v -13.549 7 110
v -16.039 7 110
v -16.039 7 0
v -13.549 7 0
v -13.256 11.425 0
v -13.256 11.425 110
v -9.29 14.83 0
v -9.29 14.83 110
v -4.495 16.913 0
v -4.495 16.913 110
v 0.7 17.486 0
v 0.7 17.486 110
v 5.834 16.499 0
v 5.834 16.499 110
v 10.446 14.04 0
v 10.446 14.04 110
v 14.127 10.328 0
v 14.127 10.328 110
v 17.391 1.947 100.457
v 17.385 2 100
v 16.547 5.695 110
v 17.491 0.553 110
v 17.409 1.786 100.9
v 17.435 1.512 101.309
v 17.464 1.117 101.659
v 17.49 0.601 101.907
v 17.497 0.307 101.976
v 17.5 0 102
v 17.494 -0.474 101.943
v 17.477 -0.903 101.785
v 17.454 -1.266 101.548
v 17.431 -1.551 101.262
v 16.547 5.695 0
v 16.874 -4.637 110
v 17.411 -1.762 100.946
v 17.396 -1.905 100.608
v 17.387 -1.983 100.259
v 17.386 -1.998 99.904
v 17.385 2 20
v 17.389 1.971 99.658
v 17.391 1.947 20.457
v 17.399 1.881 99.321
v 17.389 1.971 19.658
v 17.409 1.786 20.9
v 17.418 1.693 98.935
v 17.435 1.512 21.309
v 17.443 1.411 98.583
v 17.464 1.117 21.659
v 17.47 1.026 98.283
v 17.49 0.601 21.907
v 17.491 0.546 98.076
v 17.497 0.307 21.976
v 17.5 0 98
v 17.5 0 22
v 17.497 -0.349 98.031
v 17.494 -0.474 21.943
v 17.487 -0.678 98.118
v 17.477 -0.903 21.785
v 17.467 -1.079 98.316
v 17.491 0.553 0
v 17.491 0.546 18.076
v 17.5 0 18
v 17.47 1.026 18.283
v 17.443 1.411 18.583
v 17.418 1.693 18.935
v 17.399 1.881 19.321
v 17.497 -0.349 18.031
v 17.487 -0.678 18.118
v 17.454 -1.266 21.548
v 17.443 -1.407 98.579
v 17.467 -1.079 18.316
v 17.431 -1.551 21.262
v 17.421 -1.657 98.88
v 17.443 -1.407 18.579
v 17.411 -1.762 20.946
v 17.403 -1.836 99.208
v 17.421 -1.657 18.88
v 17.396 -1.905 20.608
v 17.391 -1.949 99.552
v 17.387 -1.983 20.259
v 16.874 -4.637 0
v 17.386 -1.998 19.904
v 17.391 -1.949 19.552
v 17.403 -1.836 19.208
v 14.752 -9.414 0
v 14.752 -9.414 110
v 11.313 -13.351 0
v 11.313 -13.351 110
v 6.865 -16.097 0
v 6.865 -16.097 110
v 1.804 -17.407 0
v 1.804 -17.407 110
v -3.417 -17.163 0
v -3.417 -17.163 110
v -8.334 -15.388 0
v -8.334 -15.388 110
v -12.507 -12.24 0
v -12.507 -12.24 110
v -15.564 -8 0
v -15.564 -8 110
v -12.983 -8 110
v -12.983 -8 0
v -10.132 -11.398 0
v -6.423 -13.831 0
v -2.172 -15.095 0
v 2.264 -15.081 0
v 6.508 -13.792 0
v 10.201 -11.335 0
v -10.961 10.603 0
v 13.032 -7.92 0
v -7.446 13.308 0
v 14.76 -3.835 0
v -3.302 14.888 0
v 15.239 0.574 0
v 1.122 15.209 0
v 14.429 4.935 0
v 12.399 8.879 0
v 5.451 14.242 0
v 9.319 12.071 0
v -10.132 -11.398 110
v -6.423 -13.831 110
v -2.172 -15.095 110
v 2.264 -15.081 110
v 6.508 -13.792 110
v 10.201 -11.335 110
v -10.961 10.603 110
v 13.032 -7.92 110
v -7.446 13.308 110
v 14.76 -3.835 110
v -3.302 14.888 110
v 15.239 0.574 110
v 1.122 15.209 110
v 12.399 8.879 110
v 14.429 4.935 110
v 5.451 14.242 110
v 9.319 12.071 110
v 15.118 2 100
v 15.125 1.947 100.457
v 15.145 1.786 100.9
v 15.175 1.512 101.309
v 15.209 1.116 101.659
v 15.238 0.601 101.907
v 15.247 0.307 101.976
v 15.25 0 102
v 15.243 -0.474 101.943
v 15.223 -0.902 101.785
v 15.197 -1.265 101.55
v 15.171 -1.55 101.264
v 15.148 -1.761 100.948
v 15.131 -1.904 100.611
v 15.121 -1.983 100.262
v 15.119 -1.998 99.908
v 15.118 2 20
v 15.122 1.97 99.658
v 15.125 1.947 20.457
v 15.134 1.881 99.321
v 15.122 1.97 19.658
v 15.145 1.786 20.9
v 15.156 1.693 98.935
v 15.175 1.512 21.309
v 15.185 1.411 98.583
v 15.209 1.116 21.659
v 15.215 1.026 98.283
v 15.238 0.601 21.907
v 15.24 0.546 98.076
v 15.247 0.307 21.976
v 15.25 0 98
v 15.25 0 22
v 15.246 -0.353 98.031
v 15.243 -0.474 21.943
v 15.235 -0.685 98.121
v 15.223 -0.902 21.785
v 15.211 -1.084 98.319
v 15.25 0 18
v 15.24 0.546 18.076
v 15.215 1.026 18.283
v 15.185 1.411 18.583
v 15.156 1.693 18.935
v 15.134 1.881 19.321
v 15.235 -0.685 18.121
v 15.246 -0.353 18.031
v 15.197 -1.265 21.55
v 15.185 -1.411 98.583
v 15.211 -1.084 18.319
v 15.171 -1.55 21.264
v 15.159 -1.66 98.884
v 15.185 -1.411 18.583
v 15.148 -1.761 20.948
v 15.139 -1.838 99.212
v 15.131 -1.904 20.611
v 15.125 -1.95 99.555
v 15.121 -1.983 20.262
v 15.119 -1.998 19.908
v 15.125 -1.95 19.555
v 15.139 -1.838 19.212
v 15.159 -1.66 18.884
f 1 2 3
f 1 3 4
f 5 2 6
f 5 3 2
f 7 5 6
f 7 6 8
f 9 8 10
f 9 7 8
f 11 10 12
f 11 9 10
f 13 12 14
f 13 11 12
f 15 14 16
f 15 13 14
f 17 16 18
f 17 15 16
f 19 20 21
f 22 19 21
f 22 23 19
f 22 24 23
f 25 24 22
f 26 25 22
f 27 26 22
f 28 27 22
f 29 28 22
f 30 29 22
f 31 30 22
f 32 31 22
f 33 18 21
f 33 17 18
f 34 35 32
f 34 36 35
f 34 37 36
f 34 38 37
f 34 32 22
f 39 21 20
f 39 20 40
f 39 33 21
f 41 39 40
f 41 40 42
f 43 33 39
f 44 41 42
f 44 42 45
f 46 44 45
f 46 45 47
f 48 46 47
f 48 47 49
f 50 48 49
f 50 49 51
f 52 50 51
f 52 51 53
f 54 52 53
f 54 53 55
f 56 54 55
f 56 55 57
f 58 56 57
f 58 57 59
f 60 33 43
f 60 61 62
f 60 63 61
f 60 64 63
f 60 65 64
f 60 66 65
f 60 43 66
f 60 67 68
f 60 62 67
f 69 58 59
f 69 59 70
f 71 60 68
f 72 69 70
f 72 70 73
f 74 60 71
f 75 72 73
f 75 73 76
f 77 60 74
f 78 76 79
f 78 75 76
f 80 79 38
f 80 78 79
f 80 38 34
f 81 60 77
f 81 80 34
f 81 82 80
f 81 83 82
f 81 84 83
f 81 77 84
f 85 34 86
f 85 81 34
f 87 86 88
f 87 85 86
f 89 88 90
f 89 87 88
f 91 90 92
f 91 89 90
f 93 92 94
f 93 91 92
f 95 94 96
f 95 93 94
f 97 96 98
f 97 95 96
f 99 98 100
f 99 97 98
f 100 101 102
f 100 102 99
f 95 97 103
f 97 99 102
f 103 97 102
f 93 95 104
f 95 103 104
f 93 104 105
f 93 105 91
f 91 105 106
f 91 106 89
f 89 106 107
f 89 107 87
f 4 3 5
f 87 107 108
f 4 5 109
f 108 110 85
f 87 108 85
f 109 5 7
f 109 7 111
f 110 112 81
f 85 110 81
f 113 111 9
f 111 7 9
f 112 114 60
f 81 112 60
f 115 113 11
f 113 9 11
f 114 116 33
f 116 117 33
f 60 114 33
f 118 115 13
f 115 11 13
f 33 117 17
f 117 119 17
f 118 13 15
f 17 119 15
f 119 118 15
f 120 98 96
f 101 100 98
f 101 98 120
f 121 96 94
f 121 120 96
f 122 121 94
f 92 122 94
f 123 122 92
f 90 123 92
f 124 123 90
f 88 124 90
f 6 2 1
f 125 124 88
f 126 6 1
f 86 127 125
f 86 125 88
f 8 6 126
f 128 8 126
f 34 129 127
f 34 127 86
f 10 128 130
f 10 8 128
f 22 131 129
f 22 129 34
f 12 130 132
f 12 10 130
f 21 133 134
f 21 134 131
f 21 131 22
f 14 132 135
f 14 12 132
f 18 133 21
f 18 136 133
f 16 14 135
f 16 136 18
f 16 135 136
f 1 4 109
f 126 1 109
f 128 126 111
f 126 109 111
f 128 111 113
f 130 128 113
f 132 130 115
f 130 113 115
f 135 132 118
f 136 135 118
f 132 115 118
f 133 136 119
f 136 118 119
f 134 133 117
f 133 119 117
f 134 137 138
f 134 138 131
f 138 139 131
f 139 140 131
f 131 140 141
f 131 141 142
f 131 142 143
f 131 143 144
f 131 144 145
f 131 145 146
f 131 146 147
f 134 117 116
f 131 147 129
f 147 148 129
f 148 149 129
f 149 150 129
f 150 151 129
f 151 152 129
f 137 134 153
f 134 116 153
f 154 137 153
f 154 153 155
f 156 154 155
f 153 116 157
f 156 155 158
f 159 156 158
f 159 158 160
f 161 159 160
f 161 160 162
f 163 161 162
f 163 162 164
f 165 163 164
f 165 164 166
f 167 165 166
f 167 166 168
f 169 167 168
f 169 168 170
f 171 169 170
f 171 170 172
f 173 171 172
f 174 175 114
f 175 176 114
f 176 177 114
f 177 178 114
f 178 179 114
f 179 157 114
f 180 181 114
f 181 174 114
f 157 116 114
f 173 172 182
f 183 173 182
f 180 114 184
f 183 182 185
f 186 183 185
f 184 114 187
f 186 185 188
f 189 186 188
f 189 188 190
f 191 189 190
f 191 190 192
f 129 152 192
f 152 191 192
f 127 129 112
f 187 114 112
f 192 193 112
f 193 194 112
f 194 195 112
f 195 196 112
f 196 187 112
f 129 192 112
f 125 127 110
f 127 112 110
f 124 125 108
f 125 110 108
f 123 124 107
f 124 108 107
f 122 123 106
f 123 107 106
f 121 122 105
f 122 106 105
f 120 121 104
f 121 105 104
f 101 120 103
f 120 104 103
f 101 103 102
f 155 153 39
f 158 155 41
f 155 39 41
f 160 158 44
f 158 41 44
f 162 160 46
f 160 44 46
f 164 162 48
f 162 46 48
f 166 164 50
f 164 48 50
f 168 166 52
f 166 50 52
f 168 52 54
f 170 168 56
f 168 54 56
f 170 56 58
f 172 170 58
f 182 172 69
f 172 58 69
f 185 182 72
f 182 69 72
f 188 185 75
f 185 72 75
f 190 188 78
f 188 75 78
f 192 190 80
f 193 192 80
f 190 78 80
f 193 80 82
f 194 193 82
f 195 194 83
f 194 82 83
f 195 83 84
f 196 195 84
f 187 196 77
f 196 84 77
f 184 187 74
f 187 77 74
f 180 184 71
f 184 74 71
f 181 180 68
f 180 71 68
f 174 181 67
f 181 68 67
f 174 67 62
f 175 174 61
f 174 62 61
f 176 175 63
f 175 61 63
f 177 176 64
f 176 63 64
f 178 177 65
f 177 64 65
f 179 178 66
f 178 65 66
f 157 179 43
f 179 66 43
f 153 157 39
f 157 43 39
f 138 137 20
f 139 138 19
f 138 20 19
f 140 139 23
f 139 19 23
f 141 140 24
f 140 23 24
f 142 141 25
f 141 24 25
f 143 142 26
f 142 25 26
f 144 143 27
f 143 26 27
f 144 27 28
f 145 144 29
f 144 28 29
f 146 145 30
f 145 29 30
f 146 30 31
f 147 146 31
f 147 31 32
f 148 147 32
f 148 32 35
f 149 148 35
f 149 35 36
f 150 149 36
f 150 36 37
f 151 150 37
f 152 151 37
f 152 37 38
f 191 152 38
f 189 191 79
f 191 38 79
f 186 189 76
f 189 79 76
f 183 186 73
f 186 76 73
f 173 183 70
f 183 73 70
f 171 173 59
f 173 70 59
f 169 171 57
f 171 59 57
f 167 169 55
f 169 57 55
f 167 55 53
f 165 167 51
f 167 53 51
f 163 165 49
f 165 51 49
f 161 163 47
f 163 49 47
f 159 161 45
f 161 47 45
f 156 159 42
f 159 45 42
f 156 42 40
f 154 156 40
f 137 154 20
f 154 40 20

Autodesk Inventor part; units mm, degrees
ref_plane "YZ Plane" through (0, 0, 0) normal (1, 0, 0) x (0, 1, 0)
ref_plane "XZ Plane" through (0, 0, 0) normal (0, 1, 0) x (-1, 0, 0)
ref_plane "XY Plane" through (0, 0, 0) normal (0, 0, 1) x (1, 0, 0)
sketch "Sketch1" plane through (0, 0, 0) normal (0, 0, 1) x (1, 0, 0)
  circle A0 centre (0, 0) radius 15.25
  circle A1 centre (0, 0) radius 17.5
  line L0 (-17.4453, -1.3829) -> (-17.4453, 0)
  line L1 (-17.9063, 7.789) -> (-15.9453, 7.789)
  line L2 (-15.9453, 7.789) -> (-15.9453, -7.211)
  line L3 (-15.9453, -7.211) -> (-17.9063, -7.211)
  line L4 (-17.9063, -7.211) -> (-17.9063, 7.789)
  line L5 (-17.9063, 7.789) -> (-15.9453, 7.789)
  line L6 (-15.9453, 7.789) -> (-15.9453, -7.211)
  line L7 (-15.9453, -7.211) -> (-17.9063, -7.211)
  line L8 (-17.9063, -7.211) -> (-17.9063, 7.789)
  point P0 (-15.9453, 0.289)
  dimension "d0" = 30.5
  dimension "d1" = 35
  dimension "d20" = 1.5
extrude "Extrusion1" add sketch "Sketch1" along normal blind 110 contours A1 L2 | L2 A1
sketch "Sketch4" plane through (0, 0, 110) normal (0, 0, 1) x (1, 0, 0)
  circle A0 centre (0, 0) radius 17.5 projected
  point P0 (17.5, 0)
sketch "Sketch6" plane through (0, 0, 110) normal (0, 0, 1) x (1, 0, 0)
  line L0 (-22.5, 7) -> (-12.5, 7)
  line L1 (-12.5, 7) -> (-12.5, -8)
  line L2 (-12.5, -8) -> (-22.5, -8)
  line L3 (-22.5, -8) -> (-22.5, 7)
  circle A0 centre (0, 0) radius 17.5 projected
  dimension "d21" = 5
  dimension "d24" = 10
extrude "Extrusion4" cut sketch "Sketch6" against normal through all contours L0 A0 L2 L3 | L0 L1 L2 A0 picked at (-14.1637, -0.5178)
ref_plane "Work Plane2" through (17.5, 0, 110) normal (1, 0, 0) x (0, 1, 0)
sketch "Sketch7" plane through (17.5, 0, 110) normal (1, 0, 0) x (0, 1, 0)
  circle A0 centre (0, -10) radius 2
  circle A1 centre (0, -90) radius 2
  line L0 (17.5, 0) -> (-17.5, 0) projected
  point P0 (0, -110)
  point P1 (-8, 0)
  point P2 (7, 0)
  point P3 (0, 0)
  dimension "d25" = 10
  dimension "d26" = 80
  dimension "d27" = 4
  dimension "d28" = 4
extrude "Extrusion5" cut sketch "Sketch7" against normal blind 10
equation "\"BendRadius\" = Thickness"
equation "\"BendReliefWidth\" = Thickness"
equation "\"BendReliefDepth\" = 0.5 * Thickness"
equation "\"CornerReliefSize\" = 4 * Thickness"
equation "\"MinimumRemnant\" = 2 * Thickness"
equation "\"TransitionRadius\" = BendRadius"
equation "\"JacobiRadiusSize\" = BendRadius"
equation "\"GapSize\" = Thickness"
equation "\"Thickness\" = 0.5"
properties part number "Solenoid Yoke"
